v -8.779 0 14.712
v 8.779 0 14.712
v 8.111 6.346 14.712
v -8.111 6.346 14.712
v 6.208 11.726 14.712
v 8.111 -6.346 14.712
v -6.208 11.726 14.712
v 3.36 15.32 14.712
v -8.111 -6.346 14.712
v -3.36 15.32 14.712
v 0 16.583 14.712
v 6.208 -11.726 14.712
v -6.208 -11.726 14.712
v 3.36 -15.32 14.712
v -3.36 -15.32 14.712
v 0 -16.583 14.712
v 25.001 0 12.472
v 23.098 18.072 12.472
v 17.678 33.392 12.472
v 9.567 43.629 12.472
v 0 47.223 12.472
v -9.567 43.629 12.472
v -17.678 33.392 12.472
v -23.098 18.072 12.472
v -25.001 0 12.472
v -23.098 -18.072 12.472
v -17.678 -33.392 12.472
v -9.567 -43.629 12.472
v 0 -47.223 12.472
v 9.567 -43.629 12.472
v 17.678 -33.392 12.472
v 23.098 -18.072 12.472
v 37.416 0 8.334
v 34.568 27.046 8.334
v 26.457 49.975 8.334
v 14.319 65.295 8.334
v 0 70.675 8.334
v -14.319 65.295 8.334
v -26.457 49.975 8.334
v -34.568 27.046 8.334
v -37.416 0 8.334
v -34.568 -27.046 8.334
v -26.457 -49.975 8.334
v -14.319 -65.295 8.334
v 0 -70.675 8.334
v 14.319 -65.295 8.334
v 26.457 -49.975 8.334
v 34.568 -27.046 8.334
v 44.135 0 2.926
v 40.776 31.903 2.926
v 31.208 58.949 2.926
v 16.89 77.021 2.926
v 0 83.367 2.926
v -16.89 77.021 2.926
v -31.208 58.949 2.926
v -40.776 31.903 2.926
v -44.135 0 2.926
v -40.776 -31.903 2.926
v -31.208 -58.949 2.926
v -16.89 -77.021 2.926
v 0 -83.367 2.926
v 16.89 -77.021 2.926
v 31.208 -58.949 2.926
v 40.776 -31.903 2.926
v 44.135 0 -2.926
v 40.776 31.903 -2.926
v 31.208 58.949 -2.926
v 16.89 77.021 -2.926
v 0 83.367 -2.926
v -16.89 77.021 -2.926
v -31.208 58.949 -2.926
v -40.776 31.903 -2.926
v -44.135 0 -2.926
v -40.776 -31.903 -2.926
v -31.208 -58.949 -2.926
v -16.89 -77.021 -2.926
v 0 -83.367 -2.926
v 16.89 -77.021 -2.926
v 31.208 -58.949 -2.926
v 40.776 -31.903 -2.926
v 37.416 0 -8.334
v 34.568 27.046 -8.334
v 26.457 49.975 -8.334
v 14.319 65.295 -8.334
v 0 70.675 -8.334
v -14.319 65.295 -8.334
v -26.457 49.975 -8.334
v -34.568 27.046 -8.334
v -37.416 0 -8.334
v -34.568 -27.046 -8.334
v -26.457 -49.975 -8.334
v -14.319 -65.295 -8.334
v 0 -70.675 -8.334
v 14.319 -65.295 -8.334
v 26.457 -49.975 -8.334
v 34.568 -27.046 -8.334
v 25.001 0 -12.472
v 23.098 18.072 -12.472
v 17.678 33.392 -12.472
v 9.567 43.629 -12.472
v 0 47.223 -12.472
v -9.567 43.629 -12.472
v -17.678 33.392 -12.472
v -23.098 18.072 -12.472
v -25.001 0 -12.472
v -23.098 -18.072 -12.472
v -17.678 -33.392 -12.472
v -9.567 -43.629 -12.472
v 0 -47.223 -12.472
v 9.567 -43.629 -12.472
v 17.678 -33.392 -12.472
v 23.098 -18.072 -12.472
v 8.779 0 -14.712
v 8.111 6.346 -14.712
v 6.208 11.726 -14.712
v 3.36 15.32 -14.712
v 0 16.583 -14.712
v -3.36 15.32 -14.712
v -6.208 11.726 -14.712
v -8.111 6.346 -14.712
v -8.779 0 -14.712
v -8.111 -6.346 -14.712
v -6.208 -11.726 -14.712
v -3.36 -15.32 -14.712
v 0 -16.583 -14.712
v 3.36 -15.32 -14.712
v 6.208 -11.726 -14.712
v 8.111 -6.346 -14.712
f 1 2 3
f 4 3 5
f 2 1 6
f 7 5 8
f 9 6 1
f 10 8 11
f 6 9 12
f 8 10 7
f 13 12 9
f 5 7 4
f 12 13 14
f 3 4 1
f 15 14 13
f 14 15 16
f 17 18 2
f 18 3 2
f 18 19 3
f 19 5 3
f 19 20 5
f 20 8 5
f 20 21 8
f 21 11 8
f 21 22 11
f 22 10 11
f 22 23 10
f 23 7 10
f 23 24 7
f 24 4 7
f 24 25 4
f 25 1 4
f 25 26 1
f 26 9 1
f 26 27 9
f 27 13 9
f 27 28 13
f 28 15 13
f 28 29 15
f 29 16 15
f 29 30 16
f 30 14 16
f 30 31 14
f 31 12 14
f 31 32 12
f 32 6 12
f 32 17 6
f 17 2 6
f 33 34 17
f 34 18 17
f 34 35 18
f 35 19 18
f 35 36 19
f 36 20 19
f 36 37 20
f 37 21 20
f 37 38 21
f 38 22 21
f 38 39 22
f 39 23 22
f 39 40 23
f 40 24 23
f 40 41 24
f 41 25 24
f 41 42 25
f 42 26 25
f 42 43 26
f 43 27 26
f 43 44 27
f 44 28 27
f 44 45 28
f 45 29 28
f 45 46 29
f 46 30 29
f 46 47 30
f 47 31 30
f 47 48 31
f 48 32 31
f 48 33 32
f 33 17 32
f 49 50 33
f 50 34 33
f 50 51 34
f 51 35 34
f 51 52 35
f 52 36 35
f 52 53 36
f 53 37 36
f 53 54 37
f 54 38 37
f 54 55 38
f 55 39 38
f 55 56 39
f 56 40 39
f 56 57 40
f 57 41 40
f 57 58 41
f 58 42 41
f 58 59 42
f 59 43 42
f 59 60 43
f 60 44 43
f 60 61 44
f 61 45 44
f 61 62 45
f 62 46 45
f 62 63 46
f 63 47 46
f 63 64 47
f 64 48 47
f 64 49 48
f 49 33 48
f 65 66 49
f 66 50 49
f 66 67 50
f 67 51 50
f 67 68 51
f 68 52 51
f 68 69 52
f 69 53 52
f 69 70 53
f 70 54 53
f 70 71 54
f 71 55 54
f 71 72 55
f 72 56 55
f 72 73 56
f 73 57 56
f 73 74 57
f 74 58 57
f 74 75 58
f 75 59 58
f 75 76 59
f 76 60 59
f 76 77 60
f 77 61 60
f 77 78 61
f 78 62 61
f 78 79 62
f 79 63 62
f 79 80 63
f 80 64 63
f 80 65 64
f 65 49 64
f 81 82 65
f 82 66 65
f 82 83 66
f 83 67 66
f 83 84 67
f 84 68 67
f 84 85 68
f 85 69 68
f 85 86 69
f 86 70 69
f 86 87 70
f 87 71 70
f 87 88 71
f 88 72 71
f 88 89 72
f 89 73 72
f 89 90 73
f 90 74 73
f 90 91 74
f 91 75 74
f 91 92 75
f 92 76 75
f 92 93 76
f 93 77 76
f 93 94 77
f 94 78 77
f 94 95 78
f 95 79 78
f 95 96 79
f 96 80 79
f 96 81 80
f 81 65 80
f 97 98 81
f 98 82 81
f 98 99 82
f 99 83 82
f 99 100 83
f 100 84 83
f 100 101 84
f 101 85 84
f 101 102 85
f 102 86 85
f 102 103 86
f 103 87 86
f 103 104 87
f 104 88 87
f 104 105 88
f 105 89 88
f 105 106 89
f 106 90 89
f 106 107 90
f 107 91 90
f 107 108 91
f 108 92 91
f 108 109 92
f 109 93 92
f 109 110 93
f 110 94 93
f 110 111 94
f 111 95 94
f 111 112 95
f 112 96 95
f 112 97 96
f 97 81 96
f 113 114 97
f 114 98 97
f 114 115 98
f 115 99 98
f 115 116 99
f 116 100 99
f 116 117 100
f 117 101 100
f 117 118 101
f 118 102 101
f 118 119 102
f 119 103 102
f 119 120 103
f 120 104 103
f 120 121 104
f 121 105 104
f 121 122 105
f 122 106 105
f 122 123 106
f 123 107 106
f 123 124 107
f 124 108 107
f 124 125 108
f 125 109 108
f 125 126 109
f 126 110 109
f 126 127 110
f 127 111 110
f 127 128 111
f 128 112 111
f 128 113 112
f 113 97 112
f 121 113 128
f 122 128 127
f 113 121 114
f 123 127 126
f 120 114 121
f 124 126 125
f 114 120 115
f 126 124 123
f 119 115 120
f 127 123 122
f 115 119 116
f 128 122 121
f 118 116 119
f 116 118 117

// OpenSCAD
// Generated by SolidPython 1.0.1 on 2020-07-29 00:46:49


scale(v = [9, 17, 3]) {
	sphere(r = 5);
}
/***********************************************
*********      SolidPython code:      **********
************************************************
 
# import packages: SolidPython
from solid import *
from solid.utils import *
from itertools import chain, combinations, permutations


class Resize:

    def __init__(self, scad_file):
        self.scad_file = scad_file
        #self.scad_file = import_scad(scad_file)
        # cone/cylinder param:
        self.r1 = 0
        self.r2 = 0
        self.h = 0
        # rectangular prism param:
        self.w = 0
        self.l = 0
        # ellipse param:
        self.r = 0

    # import OpenScad code (file name corresponds to shape)


    # classify shape + parameters
    def assign(self, param1, param2, param3):
        if self.scad_file == 'cone.scad':
            self.r1 = param1
            self.r2 = param2
            self.h = param3
        elif self.scad_file == 'cylinder.scad':
            self.r1 = param1
            self.r2 = param2
            self.h = param3
        elif self.scad_file == 'rectangularPrism.scad':
            self.h = param1
            self.l = param2
            self.w = param3
        else:
            self.r = param1
            self.h = param2

    # resize parameters
    def iterate(self):
        x = range(3, 20, 2)
        i = 1
        if self.scad_file == 'cone.scad':
            tempList = list(permutations(x, 2))
            for temp in tempList:
                param1 = temp[0]
                param2 = temp[1]
                filepath = 'produced_scad_files/' + 'cone' + str(param1) + '_' + str(param2) + '_' + '.scad'
                scad_render_to_file(cylinder(h=param1, r1=param2, r2=0), filepath)

        elif self.scad_file == 'cylinder.scad':
            tempList = list(permutations(x, 3))
            for temp in tempList:
                param1 = temp[0]
                param2 = temp[1]
                filepath = 'produced_scad_files/' + 'cylinder' + str(param1) + '_' + str(param2) + '_' + '.scad'
                scad_render_to_file(cylinder(h=param1, r1=param2, r2=param2), filepath)

        elif self.scad_file == 'rectangularPrism.scad':
            tempList = list(permutations(x, 3))
            for temp in tempList:
                param1 = temp[0]
                param2 = temp[1]
                param3 = temp[2]
                filepath = 'produced_scad_files/' + 'rectangularPrism' + str(param1) + '_' + str(param2) + '_' + str(
                    param3) + '.scad'
                scad_render_to_file(cube(size=(param1, param2, param3)), filepath)

        elif self.scad_file == 'ellipse.scad':
            tempList = list(permutations(x, 4))
            for temp in tempList:
                param1 = temp[0]
                param2 = temp[1]
                param3 = temp[2]
                param4 = temp[3]
                filepath = 'produced_scad_files/' + 'ellipse' + str(param1) + '_' + str(param2) + '_' + str(param3) + '_' + str(param4) + '.scad'
                scad_render_to_file(scale([param1, param2, param3])(sphere(r=param4)), filepath)

    def render_to_scadfile(self):
        scad_render_to_file(scad, 'example.scad') 
 
************************************************/
